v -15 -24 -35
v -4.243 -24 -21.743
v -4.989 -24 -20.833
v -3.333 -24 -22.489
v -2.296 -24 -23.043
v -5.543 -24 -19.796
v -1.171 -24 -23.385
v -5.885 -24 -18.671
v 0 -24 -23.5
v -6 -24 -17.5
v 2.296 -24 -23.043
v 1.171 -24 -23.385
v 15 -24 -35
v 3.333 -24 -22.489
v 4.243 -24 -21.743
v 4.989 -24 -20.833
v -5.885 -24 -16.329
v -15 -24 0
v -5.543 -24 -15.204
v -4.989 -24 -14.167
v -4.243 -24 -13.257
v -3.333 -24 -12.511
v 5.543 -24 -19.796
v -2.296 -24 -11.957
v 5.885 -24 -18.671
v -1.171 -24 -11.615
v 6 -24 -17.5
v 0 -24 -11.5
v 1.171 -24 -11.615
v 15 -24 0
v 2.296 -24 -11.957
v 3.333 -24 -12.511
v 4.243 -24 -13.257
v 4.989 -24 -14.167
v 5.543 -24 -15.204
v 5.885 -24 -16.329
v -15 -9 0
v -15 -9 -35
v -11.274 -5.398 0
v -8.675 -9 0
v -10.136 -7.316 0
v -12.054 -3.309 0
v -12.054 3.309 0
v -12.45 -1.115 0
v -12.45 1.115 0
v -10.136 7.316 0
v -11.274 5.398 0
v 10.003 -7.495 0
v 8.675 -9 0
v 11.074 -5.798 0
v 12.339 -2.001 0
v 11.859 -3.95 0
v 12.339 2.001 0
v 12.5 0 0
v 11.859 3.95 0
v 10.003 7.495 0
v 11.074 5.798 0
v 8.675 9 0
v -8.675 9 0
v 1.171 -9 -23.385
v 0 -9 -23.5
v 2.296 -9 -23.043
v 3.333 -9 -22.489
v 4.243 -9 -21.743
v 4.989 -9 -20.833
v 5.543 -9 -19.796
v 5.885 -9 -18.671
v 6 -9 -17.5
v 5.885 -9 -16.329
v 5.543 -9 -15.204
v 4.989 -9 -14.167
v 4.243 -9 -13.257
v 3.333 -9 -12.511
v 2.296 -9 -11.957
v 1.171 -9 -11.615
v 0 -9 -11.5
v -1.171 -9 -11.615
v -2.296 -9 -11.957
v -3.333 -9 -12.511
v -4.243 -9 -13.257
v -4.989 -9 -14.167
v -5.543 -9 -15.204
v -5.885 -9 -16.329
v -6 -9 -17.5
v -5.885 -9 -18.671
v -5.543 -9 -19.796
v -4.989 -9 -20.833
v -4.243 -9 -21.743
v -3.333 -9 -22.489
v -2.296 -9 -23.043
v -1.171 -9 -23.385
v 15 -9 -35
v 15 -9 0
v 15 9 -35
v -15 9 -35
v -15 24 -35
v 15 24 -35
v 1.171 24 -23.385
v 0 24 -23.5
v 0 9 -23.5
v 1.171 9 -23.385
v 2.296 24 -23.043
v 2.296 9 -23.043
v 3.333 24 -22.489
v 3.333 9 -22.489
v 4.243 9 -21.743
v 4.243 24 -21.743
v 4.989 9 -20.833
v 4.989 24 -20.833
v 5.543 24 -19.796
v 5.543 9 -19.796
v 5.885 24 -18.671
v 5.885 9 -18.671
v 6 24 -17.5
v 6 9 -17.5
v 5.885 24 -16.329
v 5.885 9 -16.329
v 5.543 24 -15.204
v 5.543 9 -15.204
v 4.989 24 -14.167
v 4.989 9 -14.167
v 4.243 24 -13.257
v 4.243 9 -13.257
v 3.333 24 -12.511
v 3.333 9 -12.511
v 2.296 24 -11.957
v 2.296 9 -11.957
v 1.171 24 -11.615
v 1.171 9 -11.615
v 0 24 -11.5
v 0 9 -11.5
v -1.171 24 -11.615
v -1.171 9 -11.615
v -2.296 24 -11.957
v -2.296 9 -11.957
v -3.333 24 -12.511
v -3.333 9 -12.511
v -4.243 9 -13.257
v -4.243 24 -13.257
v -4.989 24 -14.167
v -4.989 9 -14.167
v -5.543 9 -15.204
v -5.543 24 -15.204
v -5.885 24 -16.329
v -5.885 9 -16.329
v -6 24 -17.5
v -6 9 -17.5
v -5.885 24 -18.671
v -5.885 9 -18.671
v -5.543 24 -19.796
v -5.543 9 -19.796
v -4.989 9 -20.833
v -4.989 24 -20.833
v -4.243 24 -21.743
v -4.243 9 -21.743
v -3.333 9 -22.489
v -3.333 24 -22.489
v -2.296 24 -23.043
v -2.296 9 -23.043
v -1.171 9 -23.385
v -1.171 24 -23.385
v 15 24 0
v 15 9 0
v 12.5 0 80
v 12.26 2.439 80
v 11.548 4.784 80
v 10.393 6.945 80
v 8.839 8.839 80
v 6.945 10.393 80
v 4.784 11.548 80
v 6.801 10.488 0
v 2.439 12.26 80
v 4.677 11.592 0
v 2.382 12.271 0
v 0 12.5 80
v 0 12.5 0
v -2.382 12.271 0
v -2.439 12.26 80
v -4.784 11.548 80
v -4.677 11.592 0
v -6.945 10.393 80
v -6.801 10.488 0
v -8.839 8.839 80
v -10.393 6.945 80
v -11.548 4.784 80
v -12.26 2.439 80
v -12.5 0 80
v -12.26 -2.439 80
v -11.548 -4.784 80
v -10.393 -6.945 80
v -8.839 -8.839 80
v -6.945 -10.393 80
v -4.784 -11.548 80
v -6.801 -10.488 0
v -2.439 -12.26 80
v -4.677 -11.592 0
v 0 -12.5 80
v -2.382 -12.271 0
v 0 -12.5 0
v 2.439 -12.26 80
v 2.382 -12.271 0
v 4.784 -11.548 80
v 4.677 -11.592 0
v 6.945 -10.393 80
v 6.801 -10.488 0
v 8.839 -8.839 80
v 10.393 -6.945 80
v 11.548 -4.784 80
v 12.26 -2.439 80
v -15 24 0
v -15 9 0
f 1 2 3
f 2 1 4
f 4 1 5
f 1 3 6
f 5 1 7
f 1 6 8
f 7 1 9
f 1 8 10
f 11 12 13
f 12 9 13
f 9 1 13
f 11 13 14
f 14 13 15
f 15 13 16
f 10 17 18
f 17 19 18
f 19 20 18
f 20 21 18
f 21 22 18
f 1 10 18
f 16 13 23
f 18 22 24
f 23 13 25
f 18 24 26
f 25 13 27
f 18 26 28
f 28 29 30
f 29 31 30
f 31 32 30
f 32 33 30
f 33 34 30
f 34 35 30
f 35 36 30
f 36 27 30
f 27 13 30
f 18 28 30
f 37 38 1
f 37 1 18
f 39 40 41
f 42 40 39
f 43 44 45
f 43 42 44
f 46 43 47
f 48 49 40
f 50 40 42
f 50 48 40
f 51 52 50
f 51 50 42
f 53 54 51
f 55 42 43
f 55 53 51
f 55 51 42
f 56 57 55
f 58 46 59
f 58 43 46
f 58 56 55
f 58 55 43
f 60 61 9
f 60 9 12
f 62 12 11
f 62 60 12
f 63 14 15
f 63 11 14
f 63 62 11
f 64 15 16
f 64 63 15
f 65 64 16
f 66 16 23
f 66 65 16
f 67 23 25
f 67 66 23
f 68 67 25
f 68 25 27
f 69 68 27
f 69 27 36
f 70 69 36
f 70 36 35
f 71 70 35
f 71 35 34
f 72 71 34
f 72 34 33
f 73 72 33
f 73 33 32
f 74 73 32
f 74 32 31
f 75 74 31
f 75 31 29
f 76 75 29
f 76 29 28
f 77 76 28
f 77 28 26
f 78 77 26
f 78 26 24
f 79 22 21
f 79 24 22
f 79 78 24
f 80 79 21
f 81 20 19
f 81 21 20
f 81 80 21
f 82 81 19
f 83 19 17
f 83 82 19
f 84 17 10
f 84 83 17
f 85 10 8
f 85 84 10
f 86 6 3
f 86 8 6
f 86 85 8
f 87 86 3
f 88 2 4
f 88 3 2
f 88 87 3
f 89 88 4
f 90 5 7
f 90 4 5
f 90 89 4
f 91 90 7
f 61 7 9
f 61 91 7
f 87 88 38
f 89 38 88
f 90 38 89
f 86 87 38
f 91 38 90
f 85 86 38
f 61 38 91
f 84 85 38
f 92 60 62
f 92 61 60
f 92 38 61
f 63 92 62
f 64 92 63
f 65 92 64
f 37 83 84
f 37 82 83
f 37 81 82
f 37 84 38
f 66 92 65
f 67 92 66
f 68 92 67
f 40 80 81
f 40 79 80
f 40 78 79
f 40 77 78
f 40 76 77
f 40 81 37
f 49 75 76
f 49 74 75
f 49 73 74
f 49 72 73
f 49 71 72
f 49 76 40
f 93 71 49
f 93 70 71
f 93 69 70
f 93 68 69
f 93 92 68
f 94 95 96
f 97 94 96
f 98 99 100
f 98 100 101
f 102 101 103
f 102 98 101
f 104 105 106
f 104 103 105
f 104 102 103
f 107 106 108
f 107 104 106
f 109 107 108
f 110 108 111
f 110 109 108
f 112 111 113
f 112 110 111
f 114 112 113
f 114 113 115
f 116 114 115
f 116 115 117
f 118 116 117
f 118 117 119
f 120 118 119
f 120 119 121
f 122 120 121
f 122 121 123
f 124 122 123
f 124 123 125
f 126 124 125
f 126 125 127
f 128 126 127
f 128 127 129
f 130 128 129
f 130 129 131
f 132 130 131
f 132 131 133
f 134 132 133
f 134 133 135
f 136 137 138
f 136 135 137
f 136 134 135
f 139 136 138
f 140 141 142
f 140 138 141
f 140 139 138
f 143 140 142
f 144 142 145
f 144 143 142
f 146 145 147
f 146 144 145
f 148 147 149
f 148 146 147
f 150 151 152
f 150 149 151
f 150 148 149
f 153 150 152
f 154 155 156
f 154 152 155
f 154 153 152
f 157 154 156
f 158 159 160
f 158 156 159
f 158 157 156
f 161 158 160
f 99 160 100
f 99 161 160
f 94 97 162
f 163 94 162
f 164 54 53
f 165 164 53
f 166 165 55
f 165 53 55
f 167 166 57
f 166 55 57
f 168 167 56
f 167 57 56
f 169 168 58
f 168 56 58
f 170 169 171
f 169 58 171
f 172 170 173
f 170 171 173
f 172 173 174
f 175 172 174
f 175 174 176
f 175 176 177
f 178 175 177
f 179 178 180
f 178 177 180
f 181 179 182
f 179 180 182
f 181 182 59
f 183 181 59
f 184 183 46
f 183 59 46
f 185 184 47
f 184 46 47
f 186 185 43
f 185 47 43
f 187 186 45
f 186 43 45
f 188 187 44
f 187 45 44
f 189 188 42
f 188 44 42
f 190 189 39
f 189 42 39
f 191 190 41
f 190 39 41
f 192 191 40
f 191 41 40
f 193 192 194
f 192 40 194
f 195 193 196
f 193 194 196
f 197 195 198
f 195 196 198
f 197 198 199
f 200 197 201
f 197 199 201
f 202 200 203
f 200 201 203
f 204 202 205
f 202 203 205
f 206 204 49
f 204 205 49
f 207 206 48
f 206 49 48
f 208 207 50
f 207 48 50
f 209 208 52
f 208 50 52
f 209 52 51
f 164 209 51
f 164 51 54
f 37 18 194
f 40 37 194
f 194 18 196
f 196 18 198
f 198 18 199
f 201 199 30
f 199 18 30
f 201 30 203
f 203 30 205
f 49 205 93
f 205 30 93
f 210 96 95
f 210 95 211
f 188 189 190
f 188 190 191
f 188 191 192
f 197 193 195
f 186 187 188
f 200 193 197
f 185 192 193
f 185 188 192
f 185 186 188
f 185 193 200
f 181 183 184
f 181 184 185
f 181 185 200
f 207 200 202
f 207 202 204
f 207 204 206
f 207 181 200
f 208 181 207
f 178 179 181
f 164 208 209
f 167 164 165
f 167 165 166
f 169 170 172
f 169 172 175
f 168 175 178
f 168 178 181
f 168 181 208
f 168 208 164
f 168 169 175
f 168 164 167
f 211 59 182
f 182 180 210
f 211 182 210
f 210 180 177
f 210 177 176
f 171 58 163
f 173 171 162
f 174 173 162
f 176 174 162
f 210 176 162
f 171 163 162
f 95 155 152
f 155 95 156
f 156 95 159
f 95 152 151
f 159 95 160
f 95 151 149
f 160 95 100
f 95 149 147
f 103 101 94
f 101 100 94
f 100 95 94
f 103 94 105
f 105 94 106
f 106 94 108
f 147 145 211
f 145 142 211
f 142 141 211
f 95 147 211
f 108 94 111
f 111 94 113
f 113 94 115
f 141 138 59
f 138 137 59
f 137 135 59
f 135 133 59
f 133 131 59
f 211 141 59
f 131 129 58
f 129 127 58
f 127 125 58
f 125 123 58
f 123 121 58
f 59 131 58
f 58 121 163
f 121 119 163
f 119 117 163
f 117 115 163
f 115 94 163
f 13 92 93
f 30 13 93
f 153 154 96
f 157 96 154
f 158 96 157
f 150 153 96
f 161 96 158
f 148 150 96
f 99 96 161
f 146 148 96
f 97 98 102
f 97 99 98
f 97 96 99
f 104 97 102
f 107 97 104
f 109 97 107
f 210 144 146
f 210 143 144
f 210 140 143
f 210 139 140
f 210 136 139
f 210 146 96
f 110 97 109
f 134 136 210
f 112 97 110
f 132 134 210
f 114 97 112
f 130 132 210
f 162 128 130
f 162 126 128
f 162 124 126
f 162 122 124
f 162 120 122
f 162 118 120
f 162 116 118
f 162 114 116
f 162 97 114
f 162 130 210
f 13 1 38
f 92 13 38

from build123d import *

# Parameters (mm, degrees)
ESQUISSE1_R                  = 12.5
BOSS_EXTRU_1_DEPTH           = 80
BOSS_EXTRU_2_DEPTH           = 2.5
BOSS_EXTRU_2_DEPTH_BACK      = 27.5
ESQUISSE2_W                  = 35
ESQUISSE2_H                  = 48
ENL_V_MAT_EXTRU_1_DEPTH      = 89.746830929
ENL_V_MAT_EXTRU_1_DEPTH_BACK = 89.746830929
ESQUISSE3_W                  = 35
ESQUISSE3_H                  = 18
ENL_V_MAT_EXTRU_2_DEPTH      = 95.493386012
ENL_V_MAT_EXTRU_2_DEPTH_BACK = 95.493386012
ESQUISSE4_R                  = 6


with BuildPart() as part:
    # Esquisse1 → Boss.-Extru.1 (new body)
    with BuildSketch(Plane.XY):
        Circle(ESQUISSE1_R)
    extrude(amount=BOSS_EXTRU_1_DEPTH)

    # Esquisse2 → Boss.-Extru.2 (add, two sides: drawn at the far end of the back side and taken through both)
    with BuildSketch(Plane.ZY.offset(12.5).offset(-BOSS_EXTRU_2_DEPTH_BACK)):
        with Locations((-17.5, 0)):
            Rectangle(ESQUISSE2_W, ESQUISSE2_H)
    extrude(amount=BOSS_EXTRU_2_DEPTH + BOSS_EXTRU_2_DEPTH_BACK)

    # Esquisse3 → Enlèv. mat.-Extru.1 (cut, two sides: drawn at the far end of the back side and taken through both)
    with BuildSketch(Plane.ZY.offset(15).offset(-ENL_V_MAT_EXTRU_1_DEPTH_BACK)):
        with Locations((-17.5, 0)):
            Rectangle(ESQUISSE3_W, ESQUISSE3_H)
    extrude(amount=ENL_V_MAT_EXTRU_1_DEPTH + ENL_V_MAT_EXTRU_1_DEPTH_BACK, mode=Mode.SUBTRACT)

    # Esquisse4 → Enlèv. mat.-Extru.2 (cut, two sides: drawn at the far end of the back side and taken through both)
    with BuildSketch(Plane.XZ.offset(24).offset(-ENL_V_MAT_EXTRU_2_DEPTH_BACK)):
        with Locations((0, -17.5)):
            Circle(ESQUISSE4_R)
    extrude(amount=ENL_V_MAT_EXTRU_2_DEPTH + ENL_V_MAT_EXTRU_2_DEPTH_BACK, mode=Mode.SUBTRACT)


solid = part.part
